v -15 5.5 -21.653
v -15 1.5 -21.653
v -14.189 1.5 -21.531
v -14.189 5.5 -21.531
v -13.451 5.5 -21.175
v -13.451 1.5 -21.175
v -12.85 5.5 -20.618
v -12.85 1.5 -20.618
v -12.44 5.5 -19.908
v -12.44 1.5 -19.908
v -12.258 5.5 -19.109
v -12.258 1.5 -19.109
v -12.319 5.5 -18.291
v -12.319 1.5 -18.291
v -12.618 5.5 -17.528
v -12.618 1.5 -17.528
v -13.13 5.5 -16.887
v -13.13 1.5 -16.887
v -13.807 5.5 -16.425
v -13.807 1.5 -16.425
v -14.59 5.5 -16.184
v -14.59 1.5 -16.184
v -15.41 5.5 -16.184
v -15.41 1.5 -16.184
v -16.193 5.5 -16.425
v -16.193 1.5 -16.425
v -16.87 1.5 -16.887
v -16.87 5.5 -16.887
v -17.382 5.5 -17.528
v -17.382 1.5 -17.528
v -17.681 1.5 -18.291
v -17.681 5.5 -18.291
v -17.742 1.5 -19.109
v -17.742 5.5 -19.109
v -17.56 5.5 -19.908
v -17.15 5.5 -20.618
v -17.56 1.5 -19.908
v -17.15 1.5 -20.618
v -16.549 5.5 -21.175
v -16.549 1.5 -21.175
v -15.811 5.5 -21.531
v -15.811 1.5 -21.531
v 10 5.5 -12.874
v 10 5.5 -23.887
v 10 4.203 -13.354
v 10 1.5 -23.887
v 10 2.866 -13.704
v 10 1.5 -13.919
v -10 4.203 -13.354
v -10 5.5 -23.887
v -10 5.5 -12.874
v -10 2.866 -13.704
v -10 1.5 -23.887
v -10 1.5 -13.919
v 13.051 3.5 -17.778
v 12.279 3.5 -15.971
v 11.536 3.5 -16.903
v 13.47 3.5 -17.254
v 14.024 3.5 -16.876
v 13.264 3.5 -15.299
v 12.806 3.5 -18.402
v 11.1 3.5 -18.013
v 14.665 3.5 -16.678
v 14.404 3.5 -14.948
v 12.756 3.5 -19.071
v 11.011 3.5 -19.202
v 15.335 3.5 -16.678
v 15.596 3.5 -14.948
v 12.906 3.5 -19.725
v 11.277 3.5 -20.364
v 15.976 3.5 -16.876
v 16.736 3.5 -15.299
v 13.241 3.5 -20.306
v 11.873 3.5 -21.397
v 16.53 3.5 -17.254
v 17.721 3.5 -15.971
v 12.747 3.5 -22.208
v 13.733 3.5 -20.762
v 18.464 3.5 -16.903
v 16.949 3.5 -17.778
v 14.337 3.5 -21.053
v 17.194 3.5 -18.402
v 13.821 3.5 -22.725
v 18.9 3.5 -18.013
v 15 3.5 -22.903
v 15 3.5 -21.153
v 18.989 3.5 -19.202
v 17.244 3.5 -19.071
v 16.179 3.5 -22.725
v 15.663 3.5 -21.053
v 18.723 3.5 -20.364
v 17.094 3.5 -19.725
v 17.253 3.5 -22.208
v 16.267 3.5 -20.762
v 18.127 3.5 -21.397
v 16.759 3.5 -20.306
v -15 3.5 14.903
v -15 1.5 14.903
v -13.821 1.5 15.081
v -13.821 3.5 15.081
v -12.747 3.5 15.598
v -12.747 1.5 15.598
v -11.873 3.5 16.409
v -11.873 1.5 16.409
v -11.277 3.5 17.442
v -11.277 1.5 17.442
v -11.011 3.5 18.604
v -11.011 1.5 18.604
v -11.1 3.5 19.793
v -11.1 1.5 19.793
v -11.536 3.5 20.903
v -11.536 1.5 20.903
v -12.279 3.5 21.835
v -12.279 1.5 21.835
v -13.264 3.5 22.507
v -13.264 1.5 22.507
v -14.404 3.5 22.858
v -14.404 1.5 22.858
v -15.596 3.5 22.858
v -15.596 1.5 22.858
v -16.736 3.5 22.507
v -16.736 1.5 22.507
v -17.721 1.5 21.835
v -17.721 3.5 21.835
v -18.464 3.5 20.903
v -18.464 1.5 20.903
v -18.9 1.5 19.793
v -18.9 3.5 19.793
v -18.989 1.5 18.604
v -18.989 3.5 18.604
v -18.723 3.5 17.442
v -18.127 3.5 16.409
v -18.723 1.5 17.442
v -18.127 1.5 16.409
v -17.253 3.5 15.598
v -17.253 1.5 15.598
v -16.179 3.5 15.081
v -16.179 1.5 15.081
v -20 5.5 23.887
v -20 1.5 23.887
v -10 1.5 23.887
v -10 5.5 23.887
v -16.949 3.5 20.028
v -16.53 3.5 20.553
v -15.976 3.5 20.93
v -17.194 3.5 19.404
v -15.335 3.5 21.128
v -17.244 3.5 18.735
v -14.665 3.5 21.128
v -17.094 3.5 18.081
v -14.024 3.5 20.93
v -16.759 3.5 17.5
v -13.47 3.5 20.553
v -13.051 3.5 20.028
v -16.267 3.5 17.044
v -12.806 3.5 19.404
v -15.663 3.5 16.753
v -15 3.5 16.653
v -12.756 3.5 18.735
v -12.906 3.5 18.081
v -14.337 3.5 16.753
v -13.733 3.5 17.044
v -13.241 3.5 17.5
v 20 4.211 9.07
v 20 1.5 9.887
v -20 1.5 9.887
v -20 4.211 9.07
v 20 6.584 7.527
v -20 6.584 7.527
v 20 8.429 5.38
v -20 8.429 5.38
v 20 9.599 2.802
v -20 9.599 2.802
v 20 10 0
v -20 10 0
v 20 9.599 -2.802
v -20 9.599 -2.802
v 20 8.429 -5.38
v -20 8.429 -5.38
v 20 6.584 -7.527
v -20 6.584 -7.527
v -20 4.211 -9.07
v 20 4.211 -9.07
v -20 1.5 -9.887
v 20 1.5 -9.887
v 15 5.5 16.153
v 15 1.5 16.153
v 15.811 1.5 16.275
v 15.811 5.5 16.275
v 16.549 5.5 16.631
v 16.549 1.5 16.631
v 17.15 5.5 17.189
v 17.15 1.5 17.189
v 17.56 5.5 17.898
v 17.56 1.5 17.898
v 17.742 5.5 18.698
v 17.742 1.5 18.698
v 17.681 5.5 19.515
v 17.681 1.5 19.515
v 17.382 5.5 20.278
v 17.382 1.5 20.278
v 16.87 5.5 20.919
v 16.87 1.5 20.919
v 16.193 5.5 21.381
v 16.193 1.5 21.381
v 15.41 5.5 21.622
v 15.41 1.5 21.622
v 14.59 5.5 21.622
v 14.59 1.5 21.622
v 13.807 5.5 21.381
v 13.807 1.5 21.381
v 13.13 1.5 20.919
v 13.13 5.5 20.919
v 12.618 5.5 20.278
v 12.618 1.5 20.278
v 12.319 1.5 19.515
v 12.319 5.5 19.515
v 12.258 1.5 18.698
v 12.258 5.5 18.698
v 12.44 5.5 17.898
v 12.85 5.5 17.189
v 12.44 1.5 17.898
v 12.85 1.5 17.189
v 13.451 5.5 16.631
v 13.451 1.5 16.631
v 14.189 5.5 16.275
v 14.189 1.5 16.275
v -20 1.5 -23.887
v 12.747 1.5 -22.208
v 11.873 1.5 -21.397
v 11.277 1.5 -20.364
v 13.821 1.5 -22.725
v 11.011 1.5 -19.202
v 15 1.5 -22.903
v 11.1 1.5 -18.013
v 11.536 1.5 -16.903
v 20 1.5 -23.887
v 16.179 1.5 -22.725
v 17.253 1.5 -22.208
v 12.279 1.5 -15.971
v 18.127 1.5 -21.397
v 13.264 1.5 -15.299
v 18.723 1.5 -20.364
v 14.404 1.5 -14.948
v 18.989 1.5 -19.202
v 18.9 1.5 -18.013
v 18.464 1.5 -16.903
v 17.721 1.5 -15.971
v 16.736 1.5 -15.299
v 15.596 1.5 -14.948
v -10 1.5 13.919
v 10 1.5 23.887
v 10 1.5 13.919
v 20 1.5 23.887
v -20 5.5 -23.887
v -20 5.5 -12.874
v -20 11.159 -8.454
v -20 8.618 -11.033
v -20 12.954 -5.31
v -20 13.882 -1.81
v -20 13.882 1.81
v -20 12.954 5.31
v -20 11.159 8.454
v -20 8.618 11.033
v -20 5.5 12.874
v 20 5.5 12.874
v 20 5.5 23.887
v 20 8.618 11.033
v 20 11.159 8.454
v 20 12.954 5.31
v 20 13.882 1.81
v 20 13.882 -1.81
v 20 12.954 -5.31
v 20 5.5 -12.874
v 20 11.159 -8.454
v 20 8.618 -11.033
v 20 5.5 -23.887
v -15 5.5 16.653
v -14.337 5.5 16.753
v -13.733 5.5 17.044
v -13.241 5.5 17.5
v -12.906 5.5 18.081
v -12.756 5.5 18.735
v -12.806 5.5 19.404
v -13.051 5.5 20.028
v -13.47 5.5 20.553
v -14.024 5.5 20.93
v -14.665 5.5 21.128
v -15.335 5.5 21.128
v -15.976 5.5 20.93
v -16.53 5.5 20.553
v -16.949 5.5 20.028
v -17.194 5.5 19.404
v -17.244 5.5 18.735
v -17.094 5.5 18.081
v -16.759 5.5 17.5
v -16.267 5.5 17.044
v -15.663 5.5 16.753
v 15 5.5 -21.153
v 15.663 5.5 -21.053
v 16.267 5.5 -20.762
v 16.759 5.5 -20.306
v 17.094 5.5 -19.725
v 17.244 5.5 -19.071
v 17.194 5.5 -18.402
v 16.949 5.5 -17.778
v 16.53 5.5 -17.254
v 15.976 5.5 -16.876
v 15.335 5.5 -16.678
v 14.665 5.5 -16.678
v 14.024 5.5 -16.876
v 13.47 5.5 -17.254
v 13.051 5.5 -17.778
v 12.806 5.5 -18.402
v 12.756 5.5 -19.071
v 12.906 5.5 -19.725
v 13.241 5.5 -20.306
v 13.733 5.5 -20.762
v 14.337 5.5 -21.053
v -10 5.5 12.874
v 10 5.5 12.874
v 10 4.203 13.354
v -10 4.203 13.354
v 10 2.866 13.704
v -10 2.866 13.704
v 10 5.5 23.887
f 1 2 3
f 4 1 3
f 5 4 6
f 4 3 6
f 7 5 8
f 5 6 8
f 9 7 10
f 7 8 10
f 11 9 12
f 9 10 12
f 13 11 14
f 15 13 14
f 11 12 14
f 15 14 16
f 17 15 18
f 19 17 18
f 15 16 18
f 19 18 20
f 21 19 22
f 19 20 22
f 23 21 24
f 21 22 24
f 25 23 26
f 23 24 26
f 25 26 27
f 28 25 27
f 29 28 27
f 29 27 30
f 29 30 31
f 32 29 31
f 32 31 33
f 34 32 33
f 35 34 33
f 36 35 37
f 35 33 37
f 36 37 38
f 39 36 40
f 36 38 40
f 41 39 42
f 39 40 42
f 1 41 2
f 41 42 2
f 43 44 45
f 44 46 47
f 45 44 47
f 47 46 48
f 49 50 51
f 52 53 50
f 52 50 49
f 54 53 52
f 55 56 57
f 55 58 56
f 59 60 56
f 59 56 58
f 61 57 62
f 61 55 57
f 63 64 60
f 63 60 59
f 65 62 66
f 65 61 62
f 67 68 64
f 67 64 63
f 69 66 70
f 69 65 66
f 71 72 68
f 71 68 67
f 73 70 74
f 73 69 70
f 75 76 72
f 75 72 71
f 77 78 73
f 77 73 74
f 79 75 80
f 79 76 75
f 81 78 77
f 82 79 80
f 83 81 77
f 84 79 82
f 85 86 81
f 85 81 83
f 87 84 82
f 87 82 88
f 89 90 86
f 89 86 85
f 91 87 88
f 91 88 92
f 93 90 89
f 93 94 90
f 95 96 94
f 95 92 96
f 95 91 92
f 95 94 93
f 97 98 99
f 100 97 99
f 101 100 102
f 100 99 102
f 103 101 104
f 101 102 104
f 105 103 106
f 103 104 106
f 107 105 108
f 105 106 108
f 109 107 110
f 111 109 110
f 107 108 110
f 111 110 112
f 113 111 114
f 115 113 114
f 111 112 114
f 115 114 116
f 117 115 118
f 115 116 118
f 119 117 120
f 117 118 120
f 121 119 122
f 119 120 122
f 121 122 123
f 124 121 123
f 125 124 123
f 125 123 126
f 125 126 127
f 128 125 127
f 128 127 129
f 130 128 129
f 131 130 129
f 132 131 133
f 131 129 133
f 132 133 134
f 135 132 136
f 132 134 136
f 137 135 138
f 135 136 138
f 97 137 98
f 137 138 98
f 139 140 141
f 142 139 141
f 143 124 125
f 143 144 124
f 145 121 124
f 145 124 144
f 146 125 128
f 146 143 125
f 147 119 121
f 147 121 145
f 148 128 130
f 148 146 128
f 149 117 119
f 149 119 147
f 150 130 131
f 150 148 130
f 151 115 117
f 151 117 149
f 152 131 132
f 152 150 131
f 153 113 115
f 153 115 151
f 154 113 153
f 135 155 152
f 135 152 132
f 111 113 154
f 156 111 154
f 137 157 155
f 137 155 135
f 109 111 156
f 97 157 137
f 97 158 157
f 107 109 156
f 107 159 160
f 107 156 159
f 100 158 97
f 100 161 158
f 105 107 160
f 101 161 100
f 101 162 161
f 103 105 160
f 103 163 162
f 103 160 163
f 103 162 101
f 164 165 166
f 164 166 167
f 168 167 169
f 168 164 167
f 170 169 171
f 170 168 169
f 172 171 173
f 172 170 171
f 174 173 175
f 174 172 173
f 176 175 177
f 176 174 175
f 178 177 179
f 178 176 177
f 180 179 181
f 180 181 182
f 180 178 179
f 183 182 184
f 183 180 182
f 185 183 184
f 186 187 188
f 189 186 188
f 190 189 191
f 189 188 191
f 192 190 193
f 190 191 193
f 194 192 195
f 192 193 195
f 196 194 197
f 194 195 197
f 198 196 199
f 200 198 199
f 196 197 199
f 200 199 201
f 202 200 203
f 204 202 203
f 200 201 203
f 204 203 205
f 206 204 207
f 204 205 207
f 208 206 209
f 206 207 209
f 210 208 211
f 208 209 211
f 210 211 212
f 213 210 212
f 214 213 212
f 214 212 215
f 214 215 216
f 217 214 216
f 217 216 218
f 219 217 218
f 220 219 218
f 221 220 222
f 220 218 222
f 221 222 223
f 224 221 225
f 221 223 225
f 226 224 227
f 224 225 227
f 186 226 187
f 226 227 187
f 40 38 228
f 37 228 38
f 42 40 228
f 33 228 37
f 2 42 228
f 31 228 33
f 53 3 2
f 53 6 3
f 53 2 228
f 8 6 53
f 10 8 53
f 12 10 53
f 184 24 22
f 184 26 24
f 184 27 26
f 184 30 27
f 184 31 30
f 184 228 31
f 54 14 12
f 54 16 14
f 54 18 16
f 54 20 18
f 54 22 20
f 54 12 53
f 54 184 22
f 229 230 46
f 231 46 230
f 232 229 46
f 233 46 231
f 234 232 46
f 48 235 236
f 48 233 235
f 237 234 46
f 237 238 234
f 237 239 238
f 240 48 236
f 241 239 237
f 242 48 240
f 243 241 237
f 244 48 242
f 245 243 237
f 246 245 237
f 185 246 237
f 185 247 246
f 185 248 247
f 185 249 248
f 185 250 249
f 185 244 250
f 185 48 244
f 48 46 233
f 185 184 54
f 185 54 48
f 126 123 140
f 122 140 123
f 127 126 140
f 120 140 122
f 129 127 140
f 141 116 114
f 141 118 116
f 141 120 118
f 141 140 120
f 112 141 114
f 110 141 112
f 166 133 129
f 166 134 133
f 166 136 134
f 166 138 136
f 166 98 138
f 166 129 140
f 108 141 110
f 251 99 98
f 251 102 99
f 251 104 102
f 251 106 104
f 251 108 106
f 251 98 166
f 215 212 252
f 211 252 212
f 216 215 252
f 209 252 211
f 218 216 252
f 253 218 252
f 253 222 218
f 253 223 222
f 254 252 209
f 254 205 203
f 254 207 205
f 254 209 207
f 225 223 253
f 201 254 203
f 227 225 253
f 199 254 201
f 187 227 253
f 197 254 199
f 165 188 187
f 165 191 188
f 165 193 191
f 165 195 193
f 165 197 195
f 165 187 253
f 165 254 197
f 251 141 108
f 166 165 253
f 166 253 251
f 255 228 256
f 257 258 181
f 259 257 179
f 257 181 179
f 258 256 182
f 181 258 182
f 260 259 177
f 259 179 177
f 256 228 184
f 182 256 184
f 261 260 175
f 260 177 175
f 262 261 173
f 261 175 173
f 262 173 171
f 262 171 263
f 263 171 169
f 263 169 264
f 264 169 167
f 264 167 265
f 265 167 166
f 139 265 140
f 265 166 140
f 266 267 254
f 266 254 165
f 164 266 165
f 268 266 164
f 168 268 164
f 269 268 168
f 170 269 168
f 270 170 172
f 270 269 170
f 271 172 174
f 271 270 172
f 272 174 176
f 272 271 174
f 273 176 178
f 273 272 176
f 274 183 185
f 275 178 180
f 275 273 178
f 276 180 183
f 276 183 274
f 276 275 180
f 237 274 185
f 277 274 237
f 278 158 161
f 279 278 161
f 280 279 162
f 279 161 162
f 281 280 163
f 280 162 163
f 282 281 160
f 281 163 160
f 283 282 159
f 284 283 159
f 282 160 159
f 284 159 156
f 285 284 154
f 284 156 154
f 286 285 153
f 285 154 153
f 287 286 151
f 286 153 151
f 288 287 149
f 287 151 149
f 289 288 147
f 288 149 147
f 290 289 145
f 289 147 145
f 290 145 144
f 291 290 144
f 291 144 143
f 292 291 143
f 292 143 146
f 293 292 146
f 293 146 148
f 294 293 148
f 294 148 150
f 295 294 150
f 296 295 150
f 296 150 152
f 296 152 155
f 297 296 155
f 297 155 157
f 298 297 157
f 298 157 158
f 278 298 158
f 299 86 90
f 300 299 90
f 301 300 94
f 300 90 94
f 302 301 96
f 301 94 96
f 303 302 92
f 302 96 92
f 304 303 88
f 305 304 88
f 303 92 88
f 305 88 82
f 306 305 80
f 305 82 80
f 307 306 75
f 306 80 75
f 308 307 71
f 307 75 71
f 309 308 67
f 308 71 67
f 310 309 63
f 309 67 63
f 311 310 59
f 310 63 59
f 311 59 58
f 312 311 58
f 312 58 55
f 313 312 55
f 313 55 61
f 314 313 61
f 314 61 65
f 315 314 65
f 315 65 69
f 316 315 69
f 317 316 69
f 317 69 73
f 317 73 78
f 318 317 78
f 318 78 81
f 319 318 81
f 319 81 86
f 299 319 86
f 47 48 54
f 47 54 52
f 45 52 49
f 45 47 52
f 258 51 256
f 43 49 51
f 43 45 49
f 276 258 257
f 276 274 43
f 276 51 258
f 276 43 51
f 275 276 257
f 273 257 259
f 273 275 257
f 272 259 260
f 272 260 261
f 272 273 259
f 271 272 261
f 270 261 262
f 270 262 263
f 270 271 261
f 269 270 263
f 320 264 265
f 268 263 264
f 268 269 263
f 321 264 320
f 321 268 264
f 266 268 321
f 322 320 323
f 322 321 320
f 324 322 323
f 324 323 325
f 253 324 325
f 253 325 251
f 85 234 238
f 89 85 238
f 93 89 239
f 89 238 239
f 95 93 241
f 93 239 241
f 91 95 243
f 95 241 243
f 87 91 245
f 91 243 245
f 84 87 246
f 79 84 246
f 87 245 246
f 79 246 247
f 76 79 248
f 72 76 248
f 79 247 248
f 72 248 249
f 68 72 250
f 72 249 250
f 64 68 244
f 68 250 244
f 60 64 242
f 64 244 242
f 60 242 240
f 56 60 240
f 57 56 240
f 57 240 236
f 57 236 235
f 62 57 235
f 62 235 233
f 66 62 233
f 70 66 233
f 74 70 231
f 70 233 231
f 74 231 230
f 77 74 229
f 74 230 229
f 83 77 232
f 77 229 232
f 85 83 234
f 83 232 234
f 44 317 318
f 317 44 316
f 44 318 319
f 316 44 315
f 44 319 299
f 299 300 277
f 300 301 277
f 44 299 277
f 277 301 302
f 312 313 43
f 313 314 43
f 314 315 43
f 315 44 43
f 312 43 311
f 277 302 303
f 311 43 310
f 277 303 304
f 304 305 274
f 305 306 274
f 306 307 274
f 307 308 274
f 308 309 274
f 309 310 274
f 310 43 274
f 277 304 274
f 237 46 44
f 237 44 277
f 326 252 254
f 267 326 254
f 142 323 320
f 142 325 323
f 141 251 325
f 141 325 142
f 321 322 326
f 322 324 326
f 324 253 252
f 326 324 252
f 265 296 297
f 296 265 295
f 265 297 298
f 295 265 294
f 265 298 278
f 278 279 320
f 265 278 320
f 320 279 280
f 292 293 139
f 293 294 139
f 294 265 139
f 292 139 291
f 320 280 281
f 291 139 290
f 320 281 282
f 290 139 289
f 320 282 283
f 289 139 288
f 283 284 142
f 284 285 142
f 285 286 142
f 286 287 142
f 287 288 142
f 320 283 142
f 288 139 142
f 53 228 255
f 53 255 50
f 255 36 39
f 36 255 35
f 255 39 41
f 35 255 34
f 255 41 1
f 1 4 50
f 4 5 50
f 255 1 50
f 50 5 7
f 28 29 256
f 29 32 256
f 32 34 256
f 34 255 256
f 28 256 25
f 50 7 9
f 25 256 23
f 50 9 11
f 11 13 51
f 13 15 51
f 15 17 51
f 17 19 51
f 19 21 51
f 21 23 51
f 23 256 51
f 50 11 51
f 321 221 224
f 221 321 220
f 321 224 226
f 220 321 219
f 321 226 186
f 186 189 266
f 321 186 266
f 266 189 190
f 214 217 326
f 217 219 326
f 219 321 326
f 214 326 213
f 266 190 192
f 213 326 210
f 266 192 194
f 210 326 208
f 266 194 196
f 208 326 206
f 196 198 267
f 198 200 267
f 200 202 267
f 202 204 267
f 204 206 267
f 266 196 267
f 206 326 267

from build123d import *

# Parameters (mm, degrees)
BOSS_EXTRUDE2_DEPTH = 20
SKETCH2_W           = 10
SKETCH2_H           = 14
SKETCH2_R           = 2.75
SKETCH2_R_2         = 2.25
BOSS_EXTRUDE3_DEPTH = 4
SKETCH6_R           = 4
CUT_EXTRUDE1_DEPTH  = 2


with BuildPart() as part:
    # Sketch1 → Boss-Extrude2 (new, symmetric)
    with BuildSketch(Plane(origin=(0, 0, 0), x_dir=(0, 0, -1), z_dir=(1, 0, 0))):
        with BuildLine():
            Line((-13.919410907, 1.5), (-9.886859967, 1.5))
            ThreePointArc((-9.886859967, 1.5), (0, 10), (9.886859967, 1.5))
            Line((9.886859967, 1.5), (13.919410907, 1.5))
            ThreePointArc((13.919410907, 1.5), (0, 14), (-13.919410907, 1.5))
        make_face()
    extrude(amount=BOSS_EXTRUDE2_DEPTH, both=True)

    # Sketch2 → Boss-Extrude3 (add)
    # profile 1 of 4: a face of its own
    with BuildSketch(Plane.XZ.offset(-1.5)):
        with Locations((-15, -16.886859967)):
            Rectangle(SKETCH2_W, SKETCH2_H)
        with Locations(Location((-15, -18.903135437, 0), (0, 0, 270))):
            Circle(SKETCH2_R, mode=Mode.SUBTRACT)
    # profile 2 of 4: a face of its own
    with BuildSketch(Plane.XZ.offset(-1.5)):
        with Locations((15, -16.886859967)):
            Rectangle(SKETCH2_W, SKETCH2_H)
        with Locations(Location((15, -18.903135437, 0), (0, 0, 270))):
            Circle(SKETCH2_R_2, mode=Mode.SUBTRACT)
    # profile 3 of 4: a face of its own
    with BuildSketch(Plane.XZ.offset(-1.5)):
        with Locations((-15, 16.886859967)):
            Rectangle(SKETCH2_W, SKETCH2_H)
        with Locations(Location((-15, 18.903135437, 0), (0, 0, 270))):
            Circle(SKETCH2_R_2, mode=Mode.SUBTRACT)
    # profile 4 of 4: a face of its own
    with BuildSketch(Plane.XZ.offset(-1.5)):
        with Locations((15, 16.886859967)):
            Rectangle(SKETCH2_W, SKETCH2_H)
        with Locations(Location((15, 18.903135437, 0), (0, 0, 270))):
            Circle(SKETCH2_R, mode=Mode.SUBTRACT)
    extrude(amount=-BOSS_EXTRUDE3_DEPTH)

    # Sketch6 → Cut-Extrude1 (cut)
    with BuildSketch(Plane.XZ.offset(-1.5)):
        with Locations(Location((-15, 18.903135437, 0), (0, 0, 270))):
            Circle(SKETCH6_R)
        with Locations(Location((15, -18.903135437, 0), (0, 0, 270))):
            Circle(SKETCH6_R)
    extrude(amount=-CUT_EXTRUDE1_DEPTH, mode=Mode.SUBTRACT)


solid = part.part
